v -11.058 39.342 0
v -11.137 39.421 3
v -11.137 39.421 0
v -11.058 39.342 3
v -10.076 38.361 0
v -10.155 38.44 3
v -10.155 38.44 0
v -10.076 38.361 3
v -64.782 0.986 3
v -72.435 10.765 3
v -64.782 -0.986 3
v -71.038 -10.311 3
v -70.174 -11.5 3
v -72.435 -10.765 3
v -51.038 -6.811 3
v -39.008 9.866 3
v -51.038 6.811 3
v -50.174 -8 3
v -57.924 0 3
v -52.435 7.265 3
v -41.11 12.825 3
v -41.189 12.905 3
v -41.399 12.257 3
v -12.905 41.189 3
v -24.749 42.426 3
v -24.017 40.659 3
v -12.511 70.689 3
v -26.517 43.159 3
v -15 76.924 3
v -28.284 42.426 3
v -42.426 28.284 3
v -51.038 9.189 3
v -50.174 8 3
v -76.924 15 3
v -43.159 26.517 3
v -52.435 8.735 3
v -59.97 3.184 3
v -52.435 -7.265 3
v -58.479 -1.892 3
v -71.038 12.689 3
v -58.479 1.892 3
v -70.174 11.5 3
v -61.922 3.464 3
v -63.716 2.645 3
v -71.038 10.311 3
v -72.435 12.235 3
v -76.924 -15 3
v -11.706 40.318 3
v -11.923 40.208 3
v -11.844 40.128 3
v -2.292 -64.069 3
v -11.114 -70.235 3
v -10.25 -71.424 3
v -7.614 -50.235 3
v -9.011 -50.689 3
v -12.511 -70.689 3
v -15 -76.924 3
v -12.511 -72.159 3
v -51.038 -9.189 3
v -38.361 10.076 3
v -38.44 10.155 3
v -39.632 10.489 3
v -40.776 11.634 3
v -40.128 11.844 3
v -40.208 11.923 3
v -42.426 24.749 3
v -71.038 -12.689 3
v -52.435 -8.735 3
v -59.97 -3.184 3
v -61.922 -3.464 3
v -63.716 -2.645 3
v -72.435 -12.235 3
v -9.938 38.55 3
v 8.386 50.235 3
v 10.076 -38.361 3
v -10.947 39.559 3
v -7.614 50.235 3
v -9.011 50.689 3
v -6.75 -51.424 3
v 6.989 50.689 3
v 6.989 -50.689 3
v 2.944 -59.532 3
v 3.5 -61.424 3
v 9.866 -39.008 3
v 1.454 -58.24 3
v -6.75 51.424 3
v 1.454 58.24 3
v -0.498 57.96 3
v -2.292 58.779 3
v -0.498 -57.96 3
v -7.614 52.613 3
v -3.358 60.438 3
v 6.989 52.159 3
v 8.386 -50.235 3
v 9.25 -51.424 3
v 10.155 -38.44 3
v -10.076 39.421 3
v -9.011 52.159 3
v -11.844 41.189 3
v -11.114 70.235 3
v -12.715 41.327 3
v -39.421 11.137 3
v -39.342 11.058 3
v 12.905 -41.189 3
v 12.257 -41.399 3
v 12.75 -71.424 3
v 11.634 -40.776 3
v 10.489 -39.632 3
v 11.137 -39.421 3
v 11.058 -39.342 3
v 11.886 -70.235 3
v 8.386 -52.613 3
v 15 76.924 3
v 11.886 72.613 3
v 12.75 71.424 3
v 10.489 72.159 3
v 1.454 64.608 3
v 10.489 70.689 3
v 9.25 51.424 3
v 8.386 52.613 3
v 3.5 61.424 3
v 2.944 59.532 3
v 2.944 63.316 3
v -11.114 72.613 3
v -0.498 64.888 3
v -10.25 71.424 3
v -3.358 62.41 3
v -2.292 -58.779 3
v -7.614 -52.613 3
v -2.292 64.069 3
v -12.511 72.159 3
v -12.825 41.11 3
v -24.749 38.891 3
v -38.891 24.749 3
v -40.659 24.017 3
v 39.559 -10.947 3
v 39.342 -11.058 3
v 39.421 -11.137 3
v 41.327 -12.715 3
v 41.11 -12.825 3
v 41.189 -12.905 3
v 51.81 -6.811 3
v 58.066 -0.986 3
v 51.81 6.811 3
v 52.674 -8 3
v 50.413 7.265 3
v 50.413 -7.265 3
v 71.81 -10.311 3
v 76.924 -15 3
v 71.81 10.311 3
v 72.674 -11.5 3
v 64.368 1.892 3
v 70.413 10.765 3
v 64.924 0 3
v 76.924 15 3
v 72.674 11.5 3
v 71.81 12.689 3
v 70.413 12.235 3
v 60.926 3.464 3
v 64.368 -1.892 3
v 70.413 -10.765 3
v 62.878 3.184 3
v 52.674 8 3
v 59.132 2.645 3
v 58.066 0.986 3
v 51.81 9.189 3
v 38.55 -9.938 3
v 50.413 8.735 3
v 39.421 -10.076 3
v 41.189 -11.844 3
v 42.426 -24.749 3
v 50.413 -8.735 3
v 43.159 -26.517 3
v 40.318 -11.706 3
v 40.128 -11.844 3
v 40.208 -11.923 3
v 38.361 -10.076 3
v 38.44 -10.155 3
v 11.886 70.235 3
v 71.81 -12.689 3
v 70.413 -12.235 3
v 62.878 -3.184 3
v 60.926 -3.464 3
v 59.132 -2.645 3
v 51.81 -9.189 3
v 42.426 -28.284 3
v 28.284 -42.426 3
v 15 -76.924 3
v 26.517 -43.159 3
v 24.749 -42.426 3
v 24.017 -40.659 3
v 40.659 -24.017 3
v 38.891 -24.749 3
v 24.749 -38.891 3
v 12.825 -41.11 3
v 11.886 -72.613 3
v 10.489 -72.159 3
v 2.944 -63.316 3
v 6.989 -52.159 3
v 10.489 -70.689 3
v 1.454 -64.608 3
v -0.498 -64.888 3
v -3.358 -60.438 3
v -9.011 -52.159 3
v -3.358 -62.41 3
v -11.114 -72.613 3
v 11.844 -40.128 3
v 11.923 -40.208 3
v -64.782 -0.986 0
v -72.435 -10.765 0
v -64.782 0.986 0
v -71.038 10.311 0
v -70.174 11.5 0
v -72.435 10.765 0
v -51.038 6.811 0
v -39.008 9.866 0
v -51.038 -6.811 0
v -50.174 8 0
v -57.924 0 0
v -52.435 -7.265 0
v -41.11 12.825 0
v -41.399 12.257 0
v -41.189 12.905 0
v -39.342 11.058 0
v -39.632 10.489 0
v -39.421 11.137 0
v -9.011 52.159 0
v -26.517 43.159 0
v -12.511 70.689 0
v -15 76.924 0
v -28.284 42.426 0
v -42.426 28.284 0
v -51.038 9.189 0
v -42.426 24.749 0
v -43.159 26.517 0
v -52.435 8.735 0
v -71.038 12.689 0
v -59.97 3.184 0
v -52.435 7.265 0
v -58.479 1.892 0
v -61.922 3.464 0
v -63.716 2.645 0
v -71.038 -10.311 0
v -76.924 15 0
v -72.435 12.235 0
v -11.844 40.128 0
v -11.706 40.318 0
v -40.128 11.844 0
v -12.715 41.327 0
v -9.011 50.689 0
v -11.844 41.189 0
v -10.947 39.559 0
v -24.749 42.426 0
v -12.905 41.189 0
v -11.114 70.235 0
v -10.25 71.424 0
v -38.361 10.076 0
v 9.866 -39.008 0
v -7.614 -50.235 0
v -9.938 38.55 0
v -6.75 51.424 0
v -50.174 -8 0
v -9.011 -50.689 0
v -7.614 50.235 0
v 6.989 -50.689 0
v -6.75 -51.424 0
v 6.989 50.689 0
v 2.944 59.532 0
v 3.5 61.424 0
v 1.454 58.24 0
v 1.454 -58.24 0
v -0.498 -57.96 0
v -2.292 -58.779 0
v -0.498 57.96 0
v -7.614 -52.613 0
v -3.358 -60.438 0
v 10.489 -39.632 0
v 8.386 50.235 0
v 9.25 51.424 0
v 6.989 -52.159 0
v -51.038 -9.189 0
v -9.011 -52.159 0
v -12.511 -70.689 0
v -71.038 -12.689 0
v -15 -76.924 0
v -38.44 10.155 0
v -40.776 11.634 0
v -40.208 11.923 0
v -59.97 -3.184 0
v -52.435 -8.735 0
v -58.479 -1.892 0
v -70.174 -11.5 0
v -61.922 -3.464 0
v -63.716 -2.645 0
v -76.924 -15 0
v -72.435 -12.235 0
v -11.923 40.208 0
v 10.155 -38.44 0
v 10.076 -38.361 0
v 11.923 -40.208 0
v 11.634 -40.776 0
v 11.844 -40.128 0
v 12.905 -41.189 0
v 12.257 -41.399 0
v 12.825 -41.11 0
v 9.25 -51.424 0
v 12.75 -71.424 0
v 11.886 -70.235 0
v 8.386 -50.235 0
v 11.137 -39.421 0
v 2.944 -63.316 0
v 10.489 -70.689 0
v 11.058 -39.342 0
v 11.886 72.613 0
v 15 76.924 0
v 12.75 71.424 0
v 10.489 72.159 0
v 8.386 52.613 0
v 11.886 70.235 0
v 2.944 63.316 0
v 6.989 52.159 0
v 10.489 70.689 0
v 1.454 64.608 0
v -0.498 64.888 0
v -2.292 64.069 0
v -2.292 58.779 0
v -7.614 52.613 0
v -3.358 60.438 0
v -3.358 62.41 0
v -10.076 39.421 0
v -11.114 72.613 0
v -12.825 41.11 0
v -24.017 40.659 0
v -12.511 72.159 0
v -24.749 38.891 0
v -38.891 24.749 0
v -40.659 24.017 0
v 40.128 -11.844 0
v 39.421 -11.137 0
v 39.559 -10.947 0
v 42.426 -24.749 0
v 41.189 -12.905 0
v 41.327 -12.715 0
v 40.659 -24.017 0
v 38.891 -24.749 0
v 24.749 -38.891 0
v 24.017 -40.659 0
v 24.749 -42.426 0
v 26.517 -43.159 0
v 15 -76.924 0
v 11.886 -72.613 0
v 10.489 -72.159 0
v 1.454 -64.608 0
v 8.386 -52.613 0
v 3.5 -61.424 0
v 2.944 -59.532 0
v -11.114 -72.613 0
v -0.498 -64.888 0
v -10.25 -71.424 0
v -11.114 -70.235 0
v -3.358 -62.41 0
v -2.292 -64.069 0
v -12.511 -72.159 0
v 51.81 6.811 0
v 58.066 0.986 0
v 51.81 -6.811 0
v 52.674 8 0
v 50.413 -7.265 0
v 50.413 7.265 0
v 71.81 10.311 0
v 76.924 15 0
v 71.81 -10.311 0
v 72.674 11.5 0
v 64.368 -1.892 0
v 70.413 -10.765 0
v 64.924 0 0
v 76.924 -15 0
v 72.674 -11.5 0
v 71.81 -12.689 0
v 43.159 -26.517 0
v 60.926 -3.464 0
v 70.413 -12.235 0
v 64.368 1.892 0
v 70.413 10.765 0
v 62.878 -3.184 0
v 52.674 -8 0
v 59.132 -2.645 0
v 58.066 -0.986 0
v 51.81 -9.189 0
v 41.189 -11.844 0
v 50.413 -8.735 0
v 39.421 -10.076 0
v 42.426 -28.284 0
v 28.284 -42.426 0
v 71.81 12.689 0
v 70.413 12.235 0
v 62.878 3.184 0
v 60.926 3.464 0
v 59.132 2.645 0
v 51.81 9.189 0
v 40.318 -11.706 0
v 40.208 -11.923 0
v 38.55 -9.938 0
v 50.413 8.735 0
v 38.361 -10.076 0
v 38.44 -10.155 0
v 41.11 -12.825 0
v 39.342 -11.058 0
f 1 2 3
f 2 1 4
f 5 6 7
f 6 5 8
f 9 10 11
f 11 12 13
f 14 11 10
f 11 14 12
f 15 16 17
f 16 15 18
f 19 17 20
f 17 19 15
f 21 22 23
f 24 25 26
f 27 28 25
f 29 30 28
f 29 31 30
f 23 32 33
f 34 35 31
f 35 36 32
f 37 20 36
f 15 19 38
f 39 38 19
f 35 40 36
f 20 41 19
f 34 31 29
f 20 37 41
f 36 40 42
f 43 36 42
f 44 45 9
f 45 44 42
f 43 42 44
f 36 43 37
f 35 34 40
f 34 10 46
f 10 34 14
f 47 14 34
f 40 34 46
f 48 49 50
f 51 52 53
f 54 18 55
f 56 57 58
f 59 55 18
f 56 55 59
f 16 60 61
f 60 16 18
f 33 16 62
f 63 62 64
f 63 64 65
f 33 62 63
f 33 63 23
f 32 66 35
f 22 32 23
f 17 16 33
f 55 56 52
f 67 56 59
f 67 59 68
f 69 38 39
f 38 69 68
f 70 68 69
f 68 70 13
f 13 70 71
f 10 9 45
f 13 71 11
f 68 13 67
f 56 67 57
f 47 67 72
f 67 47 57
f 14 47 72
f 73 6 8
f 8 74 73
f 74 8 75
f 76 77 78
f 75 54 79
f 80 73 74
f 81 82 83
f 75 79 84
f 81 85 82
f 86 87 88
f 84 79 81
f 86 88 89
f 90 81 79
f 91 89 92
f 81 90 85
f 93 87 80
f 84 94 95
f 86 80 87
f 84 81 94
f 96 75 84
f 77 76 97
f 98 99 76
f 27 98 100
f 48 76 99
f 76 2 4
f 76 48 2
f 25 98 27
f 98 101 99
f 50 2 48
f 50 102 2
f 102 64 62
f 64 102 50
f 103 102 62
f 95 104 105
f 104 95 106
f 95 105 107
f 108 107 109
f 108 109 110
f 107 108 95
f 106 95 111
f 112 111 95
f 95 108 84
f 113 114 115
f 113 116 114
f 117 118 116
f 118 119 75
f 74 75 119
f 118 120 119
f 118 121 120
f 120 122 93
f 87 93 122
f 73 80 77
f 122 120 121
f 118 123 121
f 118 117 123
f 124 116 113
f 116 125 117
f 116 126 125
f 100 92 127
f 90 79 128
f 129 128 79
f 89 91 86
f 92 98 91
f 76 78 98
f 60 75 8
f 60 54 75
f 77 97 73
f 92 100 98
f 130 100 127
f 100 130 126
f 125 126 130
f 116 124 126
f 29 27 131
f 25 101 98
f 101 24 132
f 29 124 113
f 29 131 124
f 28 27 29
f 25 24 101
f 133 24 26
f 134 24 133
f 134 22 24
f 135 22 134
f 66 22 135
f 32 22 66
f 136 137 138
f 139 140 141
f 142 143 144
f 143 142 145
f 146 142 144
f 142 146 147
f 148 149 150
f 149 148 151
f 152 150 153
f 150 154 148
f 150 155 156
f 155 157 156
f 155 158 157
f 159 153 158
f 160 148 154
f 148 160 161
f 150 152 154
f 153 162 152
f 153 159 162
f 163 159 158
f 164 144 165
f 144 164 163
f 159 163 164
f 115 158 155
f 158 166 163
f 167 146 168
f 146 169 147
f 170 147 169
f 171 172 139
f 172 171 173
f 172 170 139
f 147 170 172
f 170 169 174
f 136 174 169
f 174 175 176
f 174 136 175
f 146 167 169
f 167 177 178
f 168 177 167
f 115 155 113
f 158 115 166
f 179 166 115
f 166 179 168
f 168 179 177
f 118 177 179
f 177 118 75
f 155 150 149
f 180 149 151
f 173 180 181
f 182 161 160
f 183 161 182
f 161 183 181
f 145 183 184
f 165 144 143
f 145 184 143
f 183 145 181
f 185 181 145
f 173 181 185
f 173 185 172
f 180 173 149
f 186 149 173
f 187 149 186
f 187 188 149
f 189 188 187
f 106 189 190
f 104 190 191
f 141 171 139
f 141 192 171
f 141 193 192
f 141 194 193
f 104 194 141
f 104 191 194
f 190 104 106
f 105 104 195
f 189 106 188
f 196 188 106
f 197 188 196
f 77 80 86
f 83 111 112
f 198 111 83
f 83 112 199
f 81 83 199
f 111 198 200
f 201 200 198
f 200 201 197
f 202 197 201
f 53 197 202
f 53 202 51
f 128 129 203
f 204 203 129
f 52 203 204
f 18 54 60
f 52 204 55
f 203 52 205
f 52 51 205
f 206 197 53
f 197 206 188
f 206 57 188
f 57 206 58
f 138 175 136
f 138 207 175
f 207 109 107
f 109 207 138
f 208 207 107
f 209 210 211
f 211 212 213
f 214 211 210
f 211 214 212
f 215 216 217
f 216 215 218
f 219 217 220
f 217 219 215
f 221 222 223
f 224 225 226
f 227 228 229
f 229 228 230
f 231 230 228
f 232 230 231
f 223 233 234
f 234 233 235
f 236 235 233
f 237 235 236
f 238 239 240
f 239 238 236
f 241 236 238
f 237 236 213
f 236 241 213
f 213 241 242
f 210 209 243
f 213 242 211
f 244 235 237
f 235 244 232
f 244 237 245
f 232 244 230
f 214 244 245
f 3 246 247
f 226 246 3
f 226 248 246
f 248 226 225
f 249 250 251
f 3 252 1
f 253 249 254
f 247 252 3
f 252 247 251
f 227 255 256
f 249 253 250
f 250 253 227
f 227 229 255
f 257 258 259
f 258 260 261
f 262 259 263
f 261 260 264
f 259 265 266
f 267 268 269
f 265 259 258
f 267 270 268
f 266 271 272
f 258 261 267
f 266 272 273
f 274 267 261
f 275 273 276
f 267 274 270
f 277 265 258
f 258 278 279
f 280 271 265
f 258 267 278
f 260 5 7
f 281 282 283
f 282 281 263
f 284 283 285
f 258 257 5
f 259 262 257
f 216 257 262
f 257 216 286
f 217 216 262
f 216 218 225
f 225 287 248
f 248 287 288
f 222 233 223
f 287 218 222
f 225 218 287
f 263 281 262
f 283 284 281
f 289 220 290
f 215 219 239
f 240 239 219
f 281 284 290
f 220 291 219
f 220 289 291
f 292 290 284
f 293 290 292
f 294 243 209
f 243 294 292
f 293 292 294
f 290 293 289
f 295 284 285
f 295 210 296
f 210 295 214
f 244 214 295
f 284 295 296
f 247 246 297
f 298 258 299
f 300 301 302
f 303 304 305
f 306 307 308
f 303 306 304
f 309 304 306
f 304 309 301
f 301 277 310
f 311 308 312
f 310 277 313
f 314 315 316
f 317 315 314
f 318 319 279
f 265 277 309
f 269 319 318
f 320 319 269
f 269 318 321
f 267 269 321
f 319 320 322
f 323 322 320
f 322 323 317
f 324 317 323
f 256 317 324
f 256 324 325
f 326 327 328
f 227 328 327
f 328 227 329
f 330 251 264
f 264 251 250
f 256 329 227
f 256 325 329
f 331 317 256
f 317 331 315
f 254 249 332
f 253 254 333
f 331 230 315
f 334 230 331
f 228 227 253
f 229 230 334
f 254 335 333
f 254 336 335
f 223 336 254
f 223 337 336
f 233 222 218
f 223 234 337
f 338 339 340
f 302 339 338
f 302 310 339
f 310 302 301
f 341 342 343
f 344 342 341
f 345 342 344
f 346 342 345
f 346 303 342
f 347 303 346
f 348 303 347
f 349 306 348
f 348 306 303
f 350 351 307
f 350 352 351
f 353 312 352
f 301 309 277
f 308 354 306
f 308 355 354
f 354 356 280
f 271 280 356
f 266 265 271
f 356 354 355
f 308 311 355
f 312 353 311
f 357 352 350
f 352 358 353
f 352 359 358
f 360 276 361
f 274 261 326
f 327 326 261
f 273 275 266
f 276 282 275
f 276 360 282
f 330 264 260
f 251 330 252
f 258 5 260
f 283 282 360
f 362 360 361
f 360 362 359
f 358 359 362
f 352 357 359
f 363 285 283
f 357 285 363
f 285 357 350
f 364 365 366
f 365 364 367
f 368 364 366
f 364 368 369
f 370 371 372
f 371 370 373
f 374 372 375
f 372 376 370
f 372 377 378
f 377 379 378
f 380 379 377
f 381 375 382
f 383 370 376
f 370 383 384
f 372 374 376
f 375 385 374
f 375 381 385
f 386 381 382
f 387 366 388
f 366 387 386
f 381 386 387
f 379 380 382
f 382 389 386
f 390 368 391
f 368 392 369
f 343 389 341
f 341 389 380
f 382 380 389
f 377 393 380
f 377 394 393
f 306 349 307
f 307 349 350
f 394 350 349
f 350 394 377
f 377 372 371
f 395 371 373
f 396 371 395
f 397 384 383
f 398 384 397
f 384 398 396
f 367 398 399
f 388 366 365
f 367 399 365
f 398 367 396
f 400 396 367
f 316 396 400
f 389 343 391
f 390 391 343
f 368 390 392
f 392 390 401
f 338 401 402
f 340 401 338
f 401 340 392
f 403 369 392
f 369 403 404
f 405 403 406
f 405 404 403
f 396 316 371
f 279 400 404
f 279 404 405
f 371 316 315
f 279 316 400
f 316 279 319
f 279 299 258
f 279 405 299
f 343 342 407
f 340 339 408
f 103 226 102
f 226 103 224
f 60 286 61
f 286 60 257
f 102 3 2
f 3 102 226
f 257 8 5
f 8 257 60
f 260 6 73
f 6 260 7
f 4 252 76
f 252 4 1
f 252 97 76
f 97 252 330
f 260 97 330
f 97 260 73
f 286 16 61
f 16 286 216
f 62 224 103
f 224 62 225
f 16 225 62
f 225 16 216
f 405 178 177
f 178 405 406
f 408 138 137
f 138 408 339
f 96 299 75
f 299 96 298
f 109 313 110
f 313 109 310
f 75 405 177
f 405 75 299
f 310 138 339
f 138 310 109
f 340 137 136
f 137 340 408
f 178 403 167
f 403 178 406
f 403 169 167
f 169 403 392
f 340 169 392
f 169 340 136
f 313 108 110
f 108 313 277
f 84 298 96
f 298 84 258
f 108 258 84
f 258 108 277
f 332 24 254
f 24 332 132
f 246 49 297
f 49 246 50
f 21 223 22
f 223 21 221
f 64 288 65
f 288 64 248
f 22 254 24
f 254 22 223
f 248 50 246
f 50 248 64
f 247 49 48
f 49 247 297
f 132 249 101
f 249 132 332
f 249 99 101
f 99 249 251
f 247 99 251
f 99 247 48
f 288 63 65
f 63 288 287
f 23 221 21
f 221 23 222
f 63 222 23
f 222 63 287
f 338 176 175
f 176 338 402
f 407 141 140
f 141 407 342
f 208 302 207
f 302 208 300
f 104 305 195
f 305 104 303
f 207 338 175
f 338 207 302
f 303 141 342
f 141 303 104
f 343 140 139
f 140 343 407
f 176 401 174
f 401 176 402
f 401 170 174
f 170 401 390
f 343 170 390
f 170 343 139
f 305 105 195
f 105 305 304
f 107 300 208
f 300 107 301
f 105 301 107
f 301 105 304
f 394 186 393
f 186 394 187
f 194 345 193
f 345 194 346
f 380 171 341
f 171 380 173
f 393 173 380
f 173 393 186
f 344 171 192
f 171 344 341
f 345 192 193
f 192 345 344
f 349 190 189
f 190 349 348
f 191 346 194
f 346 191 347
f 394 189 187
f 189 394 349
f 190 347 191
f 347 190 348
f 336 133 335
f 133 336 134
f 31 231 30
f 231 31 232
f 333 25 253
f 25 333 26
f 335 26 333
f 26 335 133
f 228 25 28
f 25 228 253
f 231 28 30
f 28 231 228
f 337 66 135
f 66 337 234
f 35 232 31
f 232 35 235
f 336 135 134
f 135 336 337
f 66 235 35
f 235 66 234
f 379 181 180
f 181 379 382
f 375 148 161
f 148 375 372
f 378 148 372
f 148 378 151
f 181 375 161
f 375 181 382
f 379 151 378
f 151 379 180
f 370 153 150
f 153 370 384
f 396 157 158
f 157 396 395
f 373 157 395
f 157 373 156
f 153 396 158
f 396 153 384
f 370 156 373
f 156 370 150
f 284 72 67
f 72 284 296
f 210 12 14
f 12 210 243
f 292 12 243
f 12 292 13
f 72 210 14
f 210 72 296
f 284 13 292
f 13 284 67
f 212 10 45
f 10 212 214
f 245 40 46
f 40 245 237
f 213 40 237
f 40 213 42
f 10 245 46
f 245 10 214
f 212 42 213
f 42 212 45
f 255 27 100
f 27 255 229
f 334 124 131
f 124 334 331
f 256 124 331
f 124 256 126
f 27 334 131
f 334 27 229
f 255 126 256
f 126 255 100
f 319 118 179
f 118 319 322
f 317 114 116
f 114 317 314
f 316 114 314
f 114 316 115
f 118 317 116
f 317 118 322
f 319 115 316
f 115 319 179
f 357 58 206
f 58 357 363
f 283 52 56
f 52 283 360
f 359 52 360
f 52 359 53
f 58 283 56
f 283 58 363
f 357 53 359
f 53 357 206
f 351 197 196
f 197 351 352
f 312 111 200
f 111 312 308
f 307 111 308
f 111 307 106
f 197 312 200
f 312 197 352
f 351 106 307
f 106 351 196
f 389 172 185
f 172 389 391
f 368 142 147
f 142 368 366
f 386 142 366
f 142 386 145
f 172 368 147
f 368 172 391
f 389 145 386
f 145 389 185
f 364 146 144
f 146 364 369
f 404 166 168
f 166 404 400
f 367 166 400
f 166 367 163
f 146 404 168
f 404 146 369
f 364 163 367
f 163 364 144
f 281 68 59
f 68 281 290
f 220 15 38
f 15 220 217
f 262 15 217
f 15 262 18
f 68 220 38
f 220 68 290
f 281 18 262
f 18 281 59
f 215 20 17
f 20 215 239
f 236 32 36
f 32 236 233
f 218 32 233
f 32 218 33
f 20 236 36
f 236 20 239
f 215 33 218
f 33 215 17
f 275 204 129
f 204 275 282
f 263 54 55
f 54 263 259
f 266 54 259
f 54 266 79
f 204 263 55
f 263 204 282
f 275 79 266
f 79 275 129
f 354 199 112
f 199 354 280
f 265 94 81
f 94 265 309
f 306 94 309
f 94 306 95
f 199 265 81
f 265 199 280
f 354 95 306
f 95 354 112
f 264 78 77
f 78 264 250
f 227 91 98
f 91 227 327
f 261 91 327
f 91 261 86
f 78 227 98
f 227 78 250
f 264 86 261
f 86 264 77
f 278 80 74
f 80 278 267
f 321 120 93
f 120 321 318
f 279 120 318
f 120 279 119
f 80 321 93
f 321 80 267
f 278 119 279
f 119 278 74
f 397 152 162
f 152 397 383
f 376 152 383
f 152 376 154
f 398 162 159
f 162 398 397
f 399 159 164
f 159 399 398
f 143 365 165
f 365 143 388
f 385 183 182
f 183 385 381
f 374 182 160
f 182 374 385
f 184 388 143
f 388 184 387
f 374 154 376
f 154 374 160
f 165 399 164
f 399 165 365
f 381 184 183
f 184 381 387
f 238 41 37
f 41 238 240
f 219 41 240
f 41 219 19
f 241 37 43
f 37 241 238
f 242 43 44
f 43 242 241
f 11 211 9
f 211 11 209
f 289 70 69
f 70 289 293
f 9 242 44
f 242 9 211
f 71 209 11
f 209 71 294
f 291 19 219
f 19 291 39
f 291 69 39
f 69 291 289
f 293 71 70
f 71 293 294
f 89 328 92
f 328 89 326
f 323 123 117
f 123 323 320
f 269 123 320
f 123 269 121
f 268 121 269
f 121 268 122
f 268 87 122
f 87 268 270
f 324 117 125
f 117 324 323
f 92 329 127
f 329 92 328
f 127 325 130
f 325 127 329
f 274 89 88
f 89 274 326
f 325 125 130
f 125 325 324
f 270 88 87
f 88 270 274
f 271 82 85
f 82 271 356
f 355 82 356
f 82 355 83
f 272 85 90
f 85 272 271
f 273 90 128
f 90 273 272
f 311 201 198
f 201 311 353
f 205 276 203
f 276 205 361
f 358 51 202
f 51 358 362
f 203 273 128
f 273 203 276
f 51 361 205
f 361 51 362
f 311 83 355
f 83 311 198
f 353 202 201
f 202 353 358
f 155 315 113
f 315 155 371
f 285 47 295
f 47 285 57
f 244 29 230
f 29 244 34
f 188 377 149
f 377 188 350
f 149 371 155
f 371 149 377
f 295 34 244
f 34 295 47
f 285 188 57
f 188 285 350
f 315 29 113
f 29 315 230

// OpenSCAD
// file: common.scad
module M25Hole(x, y, z, depth) {
    translate([x, y, z]) {
        cylinder(h = depth, d = 2.5, center = true);
    }
}

module M6Hole(x, y, z, depth) {
    translate([x, y, z]) {
        cylinder(h = depth, d = 7.0, center = true);
    }
}

module OdroidXU4MountHoles(plate_depth) {
    depth = 76;
    width = 52;

    rotate(45) {
        M25Hole(depth / 2.0, width / 2.0, 0.0, plate_depth * 2);
        M25Hole(-depth / 2.0, width / 2.0, 0.0, plate_depth * 2);
        M25Hole(depth / 2.0, -width / 2.0, 0.0, plate_depth * 2);
        M25Hole(-depth / 2.0, -width / 2.0, 0.0, plate_depth * 2);
    }
}

module StackHoles(plate_width, plate_depth, plate_diagonal) {
    between_line = 20.0;

    E = 5.5;
    F = (plate_diagonal / 2.0) - E;
    H = F - (between_line / 2.0);

    M6Hole(H, 0.0, plate_depth / 2.0, plate_depth);
    M6Hole(-H, 0.0, plate_depth / 2.0, plate_depth);
    M6Hole(0.0, H, plate_depth / 2.0, plate_depth);
    M6Hole(0.0, -H, plate_depth / 2.0, plate_depth);
}
// main file
use <common.scad>

// plate parameters
plate_width = 130.0;
plate_depth = 3.0;


module CableRoutingHoles(plate_width, plate_depth) {
  routing_width = plate_width - 35.0;
  hole_width = 20;
  hole_length = 5;

  // inner cable fastening holes
  translate([routing_width / 2.0, 0.0, plate_depth / 2.0]) {
    cube(size=[hole_length, hole_width, plate_depth], center=true);
    translate([0.0, hole_width / 2.0, -plate_depth / 2.0]) {
      cylinder(r=hole_length / 2.0, h=plate_depth, center=false);
    }
    translate([0.0, -hole_width / 2.0, -plate_depth / 2.0]) {
      cylinder(r=hole_length / 2.0, h=plate_depth, center=false);
    }
  }

  translate([-routing_width / 2.0, 0.0, plate_depth / 2.0]) {
    cube(size=[hole_length, hole_width, plate_depth], center=true);
    translate([0.0, hole_width / 2.0, -plate_depth / 2.0]) {
      cylinder(r=hole_length / 2.0, h=plate_depth, center=false);
    }
    translate([0.0, -hole_width / 2.0, -plate_depth / 2.0]) {
      cylinder(r=hole_length / 2.0, h=plate_depth, center=false);
    }
  }
}

module CableFasteningHoles(plate_width, plate_depth) {
  inner_width = plate_width - 60.0;
  outer_width = plate_width - 55.0;
  hole_width = 40;
  hole_length = 1.5;

  // inner cable fastening holes
  translate([0.0, inner_width / 2.0, plate_depth / 2.0]) {
    cube(size=[hole_width, hole_length, plate_depth], center=true);
    translate([hole_width / 2.0, 0.0, -plate_depth / 2.0]) {
      cylinder(r=hole_length / 2.0, h=plate_depth, center=false);
    }
    translate([-hole_width / 2.0, 0.0, -plate_depth / 2.0]) {
      cylinder(r=hole_length / 2.0, h=plate_depth, center=false);
    }
  }

  translate([0.0, -inner_width / 2.0, plate_depth / 2.0]) {
    cube(size=[hole_width, hole_length, plate_depth], center=true);
    translate([hole_width / 2.0, 0.0, -plate_depth / 2.0]) {
      cylinder(r=hole_length / 2.0, h=plate_depth, center=false);
    }
    translate([-hole_width / 2.0, 0.0, -plate_depth / 2.0]) {
      cylinder(r=hole_length / 2.0, h=plate_depth, center=false);
    }
  }

  // outer cable fastening holes
  translate([0.0, outer_width / 2.0, plate_depth / 2.0]) {
    cube(size=[hole_width, hole_length, plate_depth], center=true);
    translate([hole_width / 2.0, 0.0, -plate_depth / 2.0]) {
      cylinder(r=hole_length / 2.0, h=plate_depth, center=false);
    }
    translate([-hole_width / 2.0, 0.0, -plate_depth / 2.0]) {
      cylinder(r=hole_length / 2.0, h=plate_depth, center=false);
    }
  }

  translate([0.0, -outer_width / 2.0, plate_depth / 2.0]) {
    cube(size=[hole_width, hole_length, plate_depth], center=true);
    translate([hole_width / 2.0, 0.0, -plate_depth / 2.0]) {
      cylinder(r=hole_length / 2.0, h=plate_depth, center=false);
    }
    translate([-hole_width / 2.0, 0.0, -plate_depth / 2.0]) {
      cylinder(r=hole_length / 2.0, h=plate_depth, center=false);
    }
  }
}

module ArmScrewHoles(plate_width, plate_depth, plate_diagonal) {
    base_line = 23.0;
    top_line = 16.0;
    between_line = 20.0;

    E = 5.5;
    F = (plate_diagonal / 2.0) - E;
    G = F - between_line;

    // outer screw holes
    M25Hole(F, -base_line / 2.0, plate_depth / 2.0, plate_depth);
    M25Hole(F, base_line / 2.0, plate_depth / 2.0, plate_depth);

    M25Hole(-F, -base_line / 2.0, plate_depth / 2.0, plate_depth);
    M25Hole(-F, base_line / 2.0, plate_depth / 2.0, plate_depth);

    M25Hole(-base_line / 2.0, F, plate_depth / 2.0, plate_depth);
    M25Hole(base_line / 2.0, F, plate_depth / 2.0, plate_depth);

    M25Hole(-base_line / 2.0, -F, plate_depth / 2.0, plate_depth);
    M25Hole(base_line / 2.0, -F, plate_depth / 2.0, plate_depth);

    // inner screw holes
    M25Hole(G, -top_line / 2, plate_depth / 2.0, plate_depth);
    M25Hole(G, top_line / 2, plate_depth / 2.0, plate_depth);

    M25Hole(-G, -top_line / 2, plate_depth / 2.0, plate_depth);
    M25Hole(-G, top_line / 2, plate_depth / 2.0, plate_depth);

    M25Hole(-top_line / 2, -G, plate_depth / 2.0, plate_depth);
    M25Hole(top_line / 2, -G, plate_depth / 2.0, plate_depth);

    M25Hole(-top_line / 2, G, plate_depth / 2.0, plate_depth);
    M25Hole(top_line / 2, G, plate_depth / 2.0, plate_depth);
}

module TopPlate(plate_width, plate_depth) {
    difference() {
        // plate
        rotate(45) {
            translate([-plate_width / 2.0, -plate_width / 2.0, 0.0]) {
                cube([plate_width, plate_width, plate_depth]);
            }
        }

        // square cut plate corners
        A = plate_width;
        B = sqrt(2 * pow(A, 2));
        C = 30.0;
        D = 30.0;

        translate([B / 2.0, 0.0, plate_depth / 2.0]) { cube([C, D, plate_depth], true); }
        translate([-B / 2.0, 0.0, plate_depth / 2.0]) { cube([C, D, plate_depth], true); }
        translate([0.0, -B / 2.0, plate_depth / 2.0]) { cube([D, C, plate_depth], true); }
        translate([0.0, B/ 2.0, plate_depth / 2.0]) { cube([D, C, plate_depth], true); }

        // holes
        rotate(45) CableFasteningHoles(plate_width, plate_depth);
        rotate(-45) CableRoutingHoles(plate_width, plate_depth);
        ArmScrewHoles(plate_width, plate_depth, B - C);
        StackHoles(plate_width, plate_depth, B - C);
    }
}

TopPlate(plate_width, plate_depth);
